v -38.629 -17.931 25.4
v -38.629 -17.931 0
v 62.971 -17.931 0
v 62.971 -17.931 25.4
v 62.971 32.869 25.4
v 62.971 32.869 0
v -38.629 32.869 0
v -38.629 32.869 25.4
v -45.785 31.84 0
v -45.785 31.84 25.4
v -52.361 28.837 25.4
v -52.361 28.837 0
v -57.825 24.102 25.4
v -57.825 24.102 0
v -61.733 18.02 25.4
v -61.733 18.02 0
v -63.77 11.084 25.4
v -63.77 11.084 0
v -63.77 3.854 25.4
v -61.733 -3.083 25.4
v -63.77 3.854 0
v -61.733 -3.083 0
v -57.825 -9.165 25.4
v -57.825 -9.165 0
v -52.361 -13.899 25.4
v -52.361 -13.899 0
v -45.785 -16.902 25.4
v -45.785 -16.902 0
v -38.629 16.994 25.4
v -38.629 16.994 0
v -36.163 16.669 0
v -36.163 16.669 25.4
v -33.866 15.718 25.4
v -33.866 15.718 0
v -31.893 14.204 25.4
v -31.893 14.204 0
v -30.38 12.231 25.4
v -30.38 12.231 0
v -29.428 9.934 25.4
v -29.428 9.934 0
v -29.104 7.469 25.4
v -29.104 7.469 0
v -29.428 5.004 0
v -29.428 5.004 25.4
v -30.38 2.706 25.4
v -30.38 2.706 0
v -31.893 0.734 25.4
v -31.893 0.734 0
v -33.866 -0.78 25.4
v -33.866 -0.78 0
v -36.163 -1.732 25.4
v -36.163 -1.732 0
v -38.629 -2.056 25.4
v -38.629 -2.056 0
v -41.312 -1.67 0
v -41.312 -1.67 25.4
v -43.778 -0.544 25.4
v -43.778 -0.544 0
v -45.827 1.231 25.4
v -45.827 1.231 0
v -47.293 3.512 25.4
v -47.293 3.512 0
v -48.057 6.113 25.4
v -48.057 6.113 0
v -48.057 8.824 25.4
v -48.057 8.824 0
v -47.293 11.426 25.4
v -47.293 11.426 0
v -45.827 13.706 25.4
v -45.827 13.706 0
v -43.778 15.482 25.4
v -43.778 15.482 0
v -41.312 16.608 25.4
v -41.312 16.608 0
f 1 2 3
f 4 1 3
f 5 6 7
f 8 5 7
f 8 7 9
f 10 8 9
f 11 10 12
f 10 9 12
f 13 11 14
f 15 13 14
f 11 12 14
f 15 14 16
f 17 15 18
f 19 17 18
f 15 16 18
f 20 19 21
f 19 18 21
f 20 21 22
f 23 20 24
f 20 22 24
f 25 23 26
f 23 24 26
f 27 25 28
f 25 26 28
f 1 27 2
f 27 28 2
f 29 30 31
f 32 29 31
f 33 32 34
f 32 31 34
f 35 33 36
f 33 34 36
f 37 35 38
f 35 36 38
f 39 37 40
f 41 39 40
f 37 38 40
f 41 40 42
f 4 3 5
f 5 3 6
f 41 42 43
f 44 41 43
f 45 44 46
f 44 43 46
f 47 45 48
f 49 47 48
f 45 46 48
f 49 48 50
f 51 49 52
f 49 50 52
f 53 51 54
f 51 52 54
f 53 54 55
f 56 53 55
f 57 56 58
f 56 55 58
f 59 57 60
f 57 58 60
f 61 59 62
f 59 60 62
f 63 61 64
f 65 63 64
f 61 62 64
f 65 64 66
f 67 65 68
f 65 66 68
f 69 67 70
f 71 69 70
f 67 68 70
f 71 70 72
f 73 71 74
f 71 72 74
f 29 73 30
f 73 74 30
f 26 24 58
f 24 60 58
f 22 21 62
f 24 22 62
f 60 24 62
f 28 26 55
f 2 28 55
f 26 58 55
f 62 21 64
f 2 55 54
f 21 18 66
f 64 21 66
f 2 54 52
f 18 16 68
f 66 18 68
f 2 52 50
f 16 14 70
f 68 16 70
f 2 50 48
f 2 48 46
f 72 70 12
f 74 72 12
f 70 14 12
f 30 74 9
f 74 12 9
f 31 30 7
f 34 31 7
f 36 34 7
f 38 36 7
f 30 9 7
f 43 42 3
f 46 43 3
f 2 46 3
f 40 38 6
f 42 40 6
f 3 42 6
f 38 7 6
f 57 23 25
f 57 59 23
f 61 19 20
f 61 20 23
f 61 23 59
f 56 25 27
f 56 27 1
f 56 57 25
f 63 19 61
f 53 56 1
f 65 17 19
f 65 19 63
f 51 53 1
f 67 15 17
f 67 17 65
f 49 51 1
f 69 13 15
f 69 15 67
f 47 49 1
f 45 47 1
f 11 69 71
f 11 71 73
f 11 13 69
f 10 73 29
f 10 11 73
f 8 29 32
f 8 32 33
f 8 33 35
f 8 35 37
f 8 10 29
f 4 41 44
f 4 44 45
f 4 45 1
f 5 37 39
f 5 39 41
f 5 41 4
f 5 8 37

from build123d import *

# Parameters (mm, degrees)
F1_DEPTH = 25.4


with BuildPart() as f1:
    # F0 (on Top) → F1 (new body)
    with BuildSketch(Plane.XY):
        with BuildLine():
            Line((62.971446, 32.868891), (-38.628554, 32.868891))
            Line((-38.628554, 32.868891), (-38.628554, 16.993891))
            ThreePointArc((-38.628554, 16.993891), (-31.893362, 14.204083), (-29.103554, 7.468891))
            ThreePointArc((-29.103554, 7.468891), (-31.893362, 0.733699), (-38.628554, -2.056109))
            Line((-38.628554, -2.056109), (-38.628554, -17.931109))
            Line((-38.628554, -17.931109), (62.971446, -17.931109))
            Line((62.971446, -17.931109), (62.971446, 32.868891))
        make_face()
        with BuildLine():
            Line((-38.628554, 16.993891), (-38.628554, 32.868891))
            ThreePointArc((-38.628554, 32.868891), (-64.028554, 7.468891), (-38.628554, -17.931109))
            Line((-38.628554, -17.931109), (-38.628554, -2.056109))
            ThreePointArc((-38.628554, -2.056109), (-48.153554, 7.468891), (-38.628554, 16.993891))
        make_face()
    extrude(amount=F1_DEPTH)


solid = f1.part
